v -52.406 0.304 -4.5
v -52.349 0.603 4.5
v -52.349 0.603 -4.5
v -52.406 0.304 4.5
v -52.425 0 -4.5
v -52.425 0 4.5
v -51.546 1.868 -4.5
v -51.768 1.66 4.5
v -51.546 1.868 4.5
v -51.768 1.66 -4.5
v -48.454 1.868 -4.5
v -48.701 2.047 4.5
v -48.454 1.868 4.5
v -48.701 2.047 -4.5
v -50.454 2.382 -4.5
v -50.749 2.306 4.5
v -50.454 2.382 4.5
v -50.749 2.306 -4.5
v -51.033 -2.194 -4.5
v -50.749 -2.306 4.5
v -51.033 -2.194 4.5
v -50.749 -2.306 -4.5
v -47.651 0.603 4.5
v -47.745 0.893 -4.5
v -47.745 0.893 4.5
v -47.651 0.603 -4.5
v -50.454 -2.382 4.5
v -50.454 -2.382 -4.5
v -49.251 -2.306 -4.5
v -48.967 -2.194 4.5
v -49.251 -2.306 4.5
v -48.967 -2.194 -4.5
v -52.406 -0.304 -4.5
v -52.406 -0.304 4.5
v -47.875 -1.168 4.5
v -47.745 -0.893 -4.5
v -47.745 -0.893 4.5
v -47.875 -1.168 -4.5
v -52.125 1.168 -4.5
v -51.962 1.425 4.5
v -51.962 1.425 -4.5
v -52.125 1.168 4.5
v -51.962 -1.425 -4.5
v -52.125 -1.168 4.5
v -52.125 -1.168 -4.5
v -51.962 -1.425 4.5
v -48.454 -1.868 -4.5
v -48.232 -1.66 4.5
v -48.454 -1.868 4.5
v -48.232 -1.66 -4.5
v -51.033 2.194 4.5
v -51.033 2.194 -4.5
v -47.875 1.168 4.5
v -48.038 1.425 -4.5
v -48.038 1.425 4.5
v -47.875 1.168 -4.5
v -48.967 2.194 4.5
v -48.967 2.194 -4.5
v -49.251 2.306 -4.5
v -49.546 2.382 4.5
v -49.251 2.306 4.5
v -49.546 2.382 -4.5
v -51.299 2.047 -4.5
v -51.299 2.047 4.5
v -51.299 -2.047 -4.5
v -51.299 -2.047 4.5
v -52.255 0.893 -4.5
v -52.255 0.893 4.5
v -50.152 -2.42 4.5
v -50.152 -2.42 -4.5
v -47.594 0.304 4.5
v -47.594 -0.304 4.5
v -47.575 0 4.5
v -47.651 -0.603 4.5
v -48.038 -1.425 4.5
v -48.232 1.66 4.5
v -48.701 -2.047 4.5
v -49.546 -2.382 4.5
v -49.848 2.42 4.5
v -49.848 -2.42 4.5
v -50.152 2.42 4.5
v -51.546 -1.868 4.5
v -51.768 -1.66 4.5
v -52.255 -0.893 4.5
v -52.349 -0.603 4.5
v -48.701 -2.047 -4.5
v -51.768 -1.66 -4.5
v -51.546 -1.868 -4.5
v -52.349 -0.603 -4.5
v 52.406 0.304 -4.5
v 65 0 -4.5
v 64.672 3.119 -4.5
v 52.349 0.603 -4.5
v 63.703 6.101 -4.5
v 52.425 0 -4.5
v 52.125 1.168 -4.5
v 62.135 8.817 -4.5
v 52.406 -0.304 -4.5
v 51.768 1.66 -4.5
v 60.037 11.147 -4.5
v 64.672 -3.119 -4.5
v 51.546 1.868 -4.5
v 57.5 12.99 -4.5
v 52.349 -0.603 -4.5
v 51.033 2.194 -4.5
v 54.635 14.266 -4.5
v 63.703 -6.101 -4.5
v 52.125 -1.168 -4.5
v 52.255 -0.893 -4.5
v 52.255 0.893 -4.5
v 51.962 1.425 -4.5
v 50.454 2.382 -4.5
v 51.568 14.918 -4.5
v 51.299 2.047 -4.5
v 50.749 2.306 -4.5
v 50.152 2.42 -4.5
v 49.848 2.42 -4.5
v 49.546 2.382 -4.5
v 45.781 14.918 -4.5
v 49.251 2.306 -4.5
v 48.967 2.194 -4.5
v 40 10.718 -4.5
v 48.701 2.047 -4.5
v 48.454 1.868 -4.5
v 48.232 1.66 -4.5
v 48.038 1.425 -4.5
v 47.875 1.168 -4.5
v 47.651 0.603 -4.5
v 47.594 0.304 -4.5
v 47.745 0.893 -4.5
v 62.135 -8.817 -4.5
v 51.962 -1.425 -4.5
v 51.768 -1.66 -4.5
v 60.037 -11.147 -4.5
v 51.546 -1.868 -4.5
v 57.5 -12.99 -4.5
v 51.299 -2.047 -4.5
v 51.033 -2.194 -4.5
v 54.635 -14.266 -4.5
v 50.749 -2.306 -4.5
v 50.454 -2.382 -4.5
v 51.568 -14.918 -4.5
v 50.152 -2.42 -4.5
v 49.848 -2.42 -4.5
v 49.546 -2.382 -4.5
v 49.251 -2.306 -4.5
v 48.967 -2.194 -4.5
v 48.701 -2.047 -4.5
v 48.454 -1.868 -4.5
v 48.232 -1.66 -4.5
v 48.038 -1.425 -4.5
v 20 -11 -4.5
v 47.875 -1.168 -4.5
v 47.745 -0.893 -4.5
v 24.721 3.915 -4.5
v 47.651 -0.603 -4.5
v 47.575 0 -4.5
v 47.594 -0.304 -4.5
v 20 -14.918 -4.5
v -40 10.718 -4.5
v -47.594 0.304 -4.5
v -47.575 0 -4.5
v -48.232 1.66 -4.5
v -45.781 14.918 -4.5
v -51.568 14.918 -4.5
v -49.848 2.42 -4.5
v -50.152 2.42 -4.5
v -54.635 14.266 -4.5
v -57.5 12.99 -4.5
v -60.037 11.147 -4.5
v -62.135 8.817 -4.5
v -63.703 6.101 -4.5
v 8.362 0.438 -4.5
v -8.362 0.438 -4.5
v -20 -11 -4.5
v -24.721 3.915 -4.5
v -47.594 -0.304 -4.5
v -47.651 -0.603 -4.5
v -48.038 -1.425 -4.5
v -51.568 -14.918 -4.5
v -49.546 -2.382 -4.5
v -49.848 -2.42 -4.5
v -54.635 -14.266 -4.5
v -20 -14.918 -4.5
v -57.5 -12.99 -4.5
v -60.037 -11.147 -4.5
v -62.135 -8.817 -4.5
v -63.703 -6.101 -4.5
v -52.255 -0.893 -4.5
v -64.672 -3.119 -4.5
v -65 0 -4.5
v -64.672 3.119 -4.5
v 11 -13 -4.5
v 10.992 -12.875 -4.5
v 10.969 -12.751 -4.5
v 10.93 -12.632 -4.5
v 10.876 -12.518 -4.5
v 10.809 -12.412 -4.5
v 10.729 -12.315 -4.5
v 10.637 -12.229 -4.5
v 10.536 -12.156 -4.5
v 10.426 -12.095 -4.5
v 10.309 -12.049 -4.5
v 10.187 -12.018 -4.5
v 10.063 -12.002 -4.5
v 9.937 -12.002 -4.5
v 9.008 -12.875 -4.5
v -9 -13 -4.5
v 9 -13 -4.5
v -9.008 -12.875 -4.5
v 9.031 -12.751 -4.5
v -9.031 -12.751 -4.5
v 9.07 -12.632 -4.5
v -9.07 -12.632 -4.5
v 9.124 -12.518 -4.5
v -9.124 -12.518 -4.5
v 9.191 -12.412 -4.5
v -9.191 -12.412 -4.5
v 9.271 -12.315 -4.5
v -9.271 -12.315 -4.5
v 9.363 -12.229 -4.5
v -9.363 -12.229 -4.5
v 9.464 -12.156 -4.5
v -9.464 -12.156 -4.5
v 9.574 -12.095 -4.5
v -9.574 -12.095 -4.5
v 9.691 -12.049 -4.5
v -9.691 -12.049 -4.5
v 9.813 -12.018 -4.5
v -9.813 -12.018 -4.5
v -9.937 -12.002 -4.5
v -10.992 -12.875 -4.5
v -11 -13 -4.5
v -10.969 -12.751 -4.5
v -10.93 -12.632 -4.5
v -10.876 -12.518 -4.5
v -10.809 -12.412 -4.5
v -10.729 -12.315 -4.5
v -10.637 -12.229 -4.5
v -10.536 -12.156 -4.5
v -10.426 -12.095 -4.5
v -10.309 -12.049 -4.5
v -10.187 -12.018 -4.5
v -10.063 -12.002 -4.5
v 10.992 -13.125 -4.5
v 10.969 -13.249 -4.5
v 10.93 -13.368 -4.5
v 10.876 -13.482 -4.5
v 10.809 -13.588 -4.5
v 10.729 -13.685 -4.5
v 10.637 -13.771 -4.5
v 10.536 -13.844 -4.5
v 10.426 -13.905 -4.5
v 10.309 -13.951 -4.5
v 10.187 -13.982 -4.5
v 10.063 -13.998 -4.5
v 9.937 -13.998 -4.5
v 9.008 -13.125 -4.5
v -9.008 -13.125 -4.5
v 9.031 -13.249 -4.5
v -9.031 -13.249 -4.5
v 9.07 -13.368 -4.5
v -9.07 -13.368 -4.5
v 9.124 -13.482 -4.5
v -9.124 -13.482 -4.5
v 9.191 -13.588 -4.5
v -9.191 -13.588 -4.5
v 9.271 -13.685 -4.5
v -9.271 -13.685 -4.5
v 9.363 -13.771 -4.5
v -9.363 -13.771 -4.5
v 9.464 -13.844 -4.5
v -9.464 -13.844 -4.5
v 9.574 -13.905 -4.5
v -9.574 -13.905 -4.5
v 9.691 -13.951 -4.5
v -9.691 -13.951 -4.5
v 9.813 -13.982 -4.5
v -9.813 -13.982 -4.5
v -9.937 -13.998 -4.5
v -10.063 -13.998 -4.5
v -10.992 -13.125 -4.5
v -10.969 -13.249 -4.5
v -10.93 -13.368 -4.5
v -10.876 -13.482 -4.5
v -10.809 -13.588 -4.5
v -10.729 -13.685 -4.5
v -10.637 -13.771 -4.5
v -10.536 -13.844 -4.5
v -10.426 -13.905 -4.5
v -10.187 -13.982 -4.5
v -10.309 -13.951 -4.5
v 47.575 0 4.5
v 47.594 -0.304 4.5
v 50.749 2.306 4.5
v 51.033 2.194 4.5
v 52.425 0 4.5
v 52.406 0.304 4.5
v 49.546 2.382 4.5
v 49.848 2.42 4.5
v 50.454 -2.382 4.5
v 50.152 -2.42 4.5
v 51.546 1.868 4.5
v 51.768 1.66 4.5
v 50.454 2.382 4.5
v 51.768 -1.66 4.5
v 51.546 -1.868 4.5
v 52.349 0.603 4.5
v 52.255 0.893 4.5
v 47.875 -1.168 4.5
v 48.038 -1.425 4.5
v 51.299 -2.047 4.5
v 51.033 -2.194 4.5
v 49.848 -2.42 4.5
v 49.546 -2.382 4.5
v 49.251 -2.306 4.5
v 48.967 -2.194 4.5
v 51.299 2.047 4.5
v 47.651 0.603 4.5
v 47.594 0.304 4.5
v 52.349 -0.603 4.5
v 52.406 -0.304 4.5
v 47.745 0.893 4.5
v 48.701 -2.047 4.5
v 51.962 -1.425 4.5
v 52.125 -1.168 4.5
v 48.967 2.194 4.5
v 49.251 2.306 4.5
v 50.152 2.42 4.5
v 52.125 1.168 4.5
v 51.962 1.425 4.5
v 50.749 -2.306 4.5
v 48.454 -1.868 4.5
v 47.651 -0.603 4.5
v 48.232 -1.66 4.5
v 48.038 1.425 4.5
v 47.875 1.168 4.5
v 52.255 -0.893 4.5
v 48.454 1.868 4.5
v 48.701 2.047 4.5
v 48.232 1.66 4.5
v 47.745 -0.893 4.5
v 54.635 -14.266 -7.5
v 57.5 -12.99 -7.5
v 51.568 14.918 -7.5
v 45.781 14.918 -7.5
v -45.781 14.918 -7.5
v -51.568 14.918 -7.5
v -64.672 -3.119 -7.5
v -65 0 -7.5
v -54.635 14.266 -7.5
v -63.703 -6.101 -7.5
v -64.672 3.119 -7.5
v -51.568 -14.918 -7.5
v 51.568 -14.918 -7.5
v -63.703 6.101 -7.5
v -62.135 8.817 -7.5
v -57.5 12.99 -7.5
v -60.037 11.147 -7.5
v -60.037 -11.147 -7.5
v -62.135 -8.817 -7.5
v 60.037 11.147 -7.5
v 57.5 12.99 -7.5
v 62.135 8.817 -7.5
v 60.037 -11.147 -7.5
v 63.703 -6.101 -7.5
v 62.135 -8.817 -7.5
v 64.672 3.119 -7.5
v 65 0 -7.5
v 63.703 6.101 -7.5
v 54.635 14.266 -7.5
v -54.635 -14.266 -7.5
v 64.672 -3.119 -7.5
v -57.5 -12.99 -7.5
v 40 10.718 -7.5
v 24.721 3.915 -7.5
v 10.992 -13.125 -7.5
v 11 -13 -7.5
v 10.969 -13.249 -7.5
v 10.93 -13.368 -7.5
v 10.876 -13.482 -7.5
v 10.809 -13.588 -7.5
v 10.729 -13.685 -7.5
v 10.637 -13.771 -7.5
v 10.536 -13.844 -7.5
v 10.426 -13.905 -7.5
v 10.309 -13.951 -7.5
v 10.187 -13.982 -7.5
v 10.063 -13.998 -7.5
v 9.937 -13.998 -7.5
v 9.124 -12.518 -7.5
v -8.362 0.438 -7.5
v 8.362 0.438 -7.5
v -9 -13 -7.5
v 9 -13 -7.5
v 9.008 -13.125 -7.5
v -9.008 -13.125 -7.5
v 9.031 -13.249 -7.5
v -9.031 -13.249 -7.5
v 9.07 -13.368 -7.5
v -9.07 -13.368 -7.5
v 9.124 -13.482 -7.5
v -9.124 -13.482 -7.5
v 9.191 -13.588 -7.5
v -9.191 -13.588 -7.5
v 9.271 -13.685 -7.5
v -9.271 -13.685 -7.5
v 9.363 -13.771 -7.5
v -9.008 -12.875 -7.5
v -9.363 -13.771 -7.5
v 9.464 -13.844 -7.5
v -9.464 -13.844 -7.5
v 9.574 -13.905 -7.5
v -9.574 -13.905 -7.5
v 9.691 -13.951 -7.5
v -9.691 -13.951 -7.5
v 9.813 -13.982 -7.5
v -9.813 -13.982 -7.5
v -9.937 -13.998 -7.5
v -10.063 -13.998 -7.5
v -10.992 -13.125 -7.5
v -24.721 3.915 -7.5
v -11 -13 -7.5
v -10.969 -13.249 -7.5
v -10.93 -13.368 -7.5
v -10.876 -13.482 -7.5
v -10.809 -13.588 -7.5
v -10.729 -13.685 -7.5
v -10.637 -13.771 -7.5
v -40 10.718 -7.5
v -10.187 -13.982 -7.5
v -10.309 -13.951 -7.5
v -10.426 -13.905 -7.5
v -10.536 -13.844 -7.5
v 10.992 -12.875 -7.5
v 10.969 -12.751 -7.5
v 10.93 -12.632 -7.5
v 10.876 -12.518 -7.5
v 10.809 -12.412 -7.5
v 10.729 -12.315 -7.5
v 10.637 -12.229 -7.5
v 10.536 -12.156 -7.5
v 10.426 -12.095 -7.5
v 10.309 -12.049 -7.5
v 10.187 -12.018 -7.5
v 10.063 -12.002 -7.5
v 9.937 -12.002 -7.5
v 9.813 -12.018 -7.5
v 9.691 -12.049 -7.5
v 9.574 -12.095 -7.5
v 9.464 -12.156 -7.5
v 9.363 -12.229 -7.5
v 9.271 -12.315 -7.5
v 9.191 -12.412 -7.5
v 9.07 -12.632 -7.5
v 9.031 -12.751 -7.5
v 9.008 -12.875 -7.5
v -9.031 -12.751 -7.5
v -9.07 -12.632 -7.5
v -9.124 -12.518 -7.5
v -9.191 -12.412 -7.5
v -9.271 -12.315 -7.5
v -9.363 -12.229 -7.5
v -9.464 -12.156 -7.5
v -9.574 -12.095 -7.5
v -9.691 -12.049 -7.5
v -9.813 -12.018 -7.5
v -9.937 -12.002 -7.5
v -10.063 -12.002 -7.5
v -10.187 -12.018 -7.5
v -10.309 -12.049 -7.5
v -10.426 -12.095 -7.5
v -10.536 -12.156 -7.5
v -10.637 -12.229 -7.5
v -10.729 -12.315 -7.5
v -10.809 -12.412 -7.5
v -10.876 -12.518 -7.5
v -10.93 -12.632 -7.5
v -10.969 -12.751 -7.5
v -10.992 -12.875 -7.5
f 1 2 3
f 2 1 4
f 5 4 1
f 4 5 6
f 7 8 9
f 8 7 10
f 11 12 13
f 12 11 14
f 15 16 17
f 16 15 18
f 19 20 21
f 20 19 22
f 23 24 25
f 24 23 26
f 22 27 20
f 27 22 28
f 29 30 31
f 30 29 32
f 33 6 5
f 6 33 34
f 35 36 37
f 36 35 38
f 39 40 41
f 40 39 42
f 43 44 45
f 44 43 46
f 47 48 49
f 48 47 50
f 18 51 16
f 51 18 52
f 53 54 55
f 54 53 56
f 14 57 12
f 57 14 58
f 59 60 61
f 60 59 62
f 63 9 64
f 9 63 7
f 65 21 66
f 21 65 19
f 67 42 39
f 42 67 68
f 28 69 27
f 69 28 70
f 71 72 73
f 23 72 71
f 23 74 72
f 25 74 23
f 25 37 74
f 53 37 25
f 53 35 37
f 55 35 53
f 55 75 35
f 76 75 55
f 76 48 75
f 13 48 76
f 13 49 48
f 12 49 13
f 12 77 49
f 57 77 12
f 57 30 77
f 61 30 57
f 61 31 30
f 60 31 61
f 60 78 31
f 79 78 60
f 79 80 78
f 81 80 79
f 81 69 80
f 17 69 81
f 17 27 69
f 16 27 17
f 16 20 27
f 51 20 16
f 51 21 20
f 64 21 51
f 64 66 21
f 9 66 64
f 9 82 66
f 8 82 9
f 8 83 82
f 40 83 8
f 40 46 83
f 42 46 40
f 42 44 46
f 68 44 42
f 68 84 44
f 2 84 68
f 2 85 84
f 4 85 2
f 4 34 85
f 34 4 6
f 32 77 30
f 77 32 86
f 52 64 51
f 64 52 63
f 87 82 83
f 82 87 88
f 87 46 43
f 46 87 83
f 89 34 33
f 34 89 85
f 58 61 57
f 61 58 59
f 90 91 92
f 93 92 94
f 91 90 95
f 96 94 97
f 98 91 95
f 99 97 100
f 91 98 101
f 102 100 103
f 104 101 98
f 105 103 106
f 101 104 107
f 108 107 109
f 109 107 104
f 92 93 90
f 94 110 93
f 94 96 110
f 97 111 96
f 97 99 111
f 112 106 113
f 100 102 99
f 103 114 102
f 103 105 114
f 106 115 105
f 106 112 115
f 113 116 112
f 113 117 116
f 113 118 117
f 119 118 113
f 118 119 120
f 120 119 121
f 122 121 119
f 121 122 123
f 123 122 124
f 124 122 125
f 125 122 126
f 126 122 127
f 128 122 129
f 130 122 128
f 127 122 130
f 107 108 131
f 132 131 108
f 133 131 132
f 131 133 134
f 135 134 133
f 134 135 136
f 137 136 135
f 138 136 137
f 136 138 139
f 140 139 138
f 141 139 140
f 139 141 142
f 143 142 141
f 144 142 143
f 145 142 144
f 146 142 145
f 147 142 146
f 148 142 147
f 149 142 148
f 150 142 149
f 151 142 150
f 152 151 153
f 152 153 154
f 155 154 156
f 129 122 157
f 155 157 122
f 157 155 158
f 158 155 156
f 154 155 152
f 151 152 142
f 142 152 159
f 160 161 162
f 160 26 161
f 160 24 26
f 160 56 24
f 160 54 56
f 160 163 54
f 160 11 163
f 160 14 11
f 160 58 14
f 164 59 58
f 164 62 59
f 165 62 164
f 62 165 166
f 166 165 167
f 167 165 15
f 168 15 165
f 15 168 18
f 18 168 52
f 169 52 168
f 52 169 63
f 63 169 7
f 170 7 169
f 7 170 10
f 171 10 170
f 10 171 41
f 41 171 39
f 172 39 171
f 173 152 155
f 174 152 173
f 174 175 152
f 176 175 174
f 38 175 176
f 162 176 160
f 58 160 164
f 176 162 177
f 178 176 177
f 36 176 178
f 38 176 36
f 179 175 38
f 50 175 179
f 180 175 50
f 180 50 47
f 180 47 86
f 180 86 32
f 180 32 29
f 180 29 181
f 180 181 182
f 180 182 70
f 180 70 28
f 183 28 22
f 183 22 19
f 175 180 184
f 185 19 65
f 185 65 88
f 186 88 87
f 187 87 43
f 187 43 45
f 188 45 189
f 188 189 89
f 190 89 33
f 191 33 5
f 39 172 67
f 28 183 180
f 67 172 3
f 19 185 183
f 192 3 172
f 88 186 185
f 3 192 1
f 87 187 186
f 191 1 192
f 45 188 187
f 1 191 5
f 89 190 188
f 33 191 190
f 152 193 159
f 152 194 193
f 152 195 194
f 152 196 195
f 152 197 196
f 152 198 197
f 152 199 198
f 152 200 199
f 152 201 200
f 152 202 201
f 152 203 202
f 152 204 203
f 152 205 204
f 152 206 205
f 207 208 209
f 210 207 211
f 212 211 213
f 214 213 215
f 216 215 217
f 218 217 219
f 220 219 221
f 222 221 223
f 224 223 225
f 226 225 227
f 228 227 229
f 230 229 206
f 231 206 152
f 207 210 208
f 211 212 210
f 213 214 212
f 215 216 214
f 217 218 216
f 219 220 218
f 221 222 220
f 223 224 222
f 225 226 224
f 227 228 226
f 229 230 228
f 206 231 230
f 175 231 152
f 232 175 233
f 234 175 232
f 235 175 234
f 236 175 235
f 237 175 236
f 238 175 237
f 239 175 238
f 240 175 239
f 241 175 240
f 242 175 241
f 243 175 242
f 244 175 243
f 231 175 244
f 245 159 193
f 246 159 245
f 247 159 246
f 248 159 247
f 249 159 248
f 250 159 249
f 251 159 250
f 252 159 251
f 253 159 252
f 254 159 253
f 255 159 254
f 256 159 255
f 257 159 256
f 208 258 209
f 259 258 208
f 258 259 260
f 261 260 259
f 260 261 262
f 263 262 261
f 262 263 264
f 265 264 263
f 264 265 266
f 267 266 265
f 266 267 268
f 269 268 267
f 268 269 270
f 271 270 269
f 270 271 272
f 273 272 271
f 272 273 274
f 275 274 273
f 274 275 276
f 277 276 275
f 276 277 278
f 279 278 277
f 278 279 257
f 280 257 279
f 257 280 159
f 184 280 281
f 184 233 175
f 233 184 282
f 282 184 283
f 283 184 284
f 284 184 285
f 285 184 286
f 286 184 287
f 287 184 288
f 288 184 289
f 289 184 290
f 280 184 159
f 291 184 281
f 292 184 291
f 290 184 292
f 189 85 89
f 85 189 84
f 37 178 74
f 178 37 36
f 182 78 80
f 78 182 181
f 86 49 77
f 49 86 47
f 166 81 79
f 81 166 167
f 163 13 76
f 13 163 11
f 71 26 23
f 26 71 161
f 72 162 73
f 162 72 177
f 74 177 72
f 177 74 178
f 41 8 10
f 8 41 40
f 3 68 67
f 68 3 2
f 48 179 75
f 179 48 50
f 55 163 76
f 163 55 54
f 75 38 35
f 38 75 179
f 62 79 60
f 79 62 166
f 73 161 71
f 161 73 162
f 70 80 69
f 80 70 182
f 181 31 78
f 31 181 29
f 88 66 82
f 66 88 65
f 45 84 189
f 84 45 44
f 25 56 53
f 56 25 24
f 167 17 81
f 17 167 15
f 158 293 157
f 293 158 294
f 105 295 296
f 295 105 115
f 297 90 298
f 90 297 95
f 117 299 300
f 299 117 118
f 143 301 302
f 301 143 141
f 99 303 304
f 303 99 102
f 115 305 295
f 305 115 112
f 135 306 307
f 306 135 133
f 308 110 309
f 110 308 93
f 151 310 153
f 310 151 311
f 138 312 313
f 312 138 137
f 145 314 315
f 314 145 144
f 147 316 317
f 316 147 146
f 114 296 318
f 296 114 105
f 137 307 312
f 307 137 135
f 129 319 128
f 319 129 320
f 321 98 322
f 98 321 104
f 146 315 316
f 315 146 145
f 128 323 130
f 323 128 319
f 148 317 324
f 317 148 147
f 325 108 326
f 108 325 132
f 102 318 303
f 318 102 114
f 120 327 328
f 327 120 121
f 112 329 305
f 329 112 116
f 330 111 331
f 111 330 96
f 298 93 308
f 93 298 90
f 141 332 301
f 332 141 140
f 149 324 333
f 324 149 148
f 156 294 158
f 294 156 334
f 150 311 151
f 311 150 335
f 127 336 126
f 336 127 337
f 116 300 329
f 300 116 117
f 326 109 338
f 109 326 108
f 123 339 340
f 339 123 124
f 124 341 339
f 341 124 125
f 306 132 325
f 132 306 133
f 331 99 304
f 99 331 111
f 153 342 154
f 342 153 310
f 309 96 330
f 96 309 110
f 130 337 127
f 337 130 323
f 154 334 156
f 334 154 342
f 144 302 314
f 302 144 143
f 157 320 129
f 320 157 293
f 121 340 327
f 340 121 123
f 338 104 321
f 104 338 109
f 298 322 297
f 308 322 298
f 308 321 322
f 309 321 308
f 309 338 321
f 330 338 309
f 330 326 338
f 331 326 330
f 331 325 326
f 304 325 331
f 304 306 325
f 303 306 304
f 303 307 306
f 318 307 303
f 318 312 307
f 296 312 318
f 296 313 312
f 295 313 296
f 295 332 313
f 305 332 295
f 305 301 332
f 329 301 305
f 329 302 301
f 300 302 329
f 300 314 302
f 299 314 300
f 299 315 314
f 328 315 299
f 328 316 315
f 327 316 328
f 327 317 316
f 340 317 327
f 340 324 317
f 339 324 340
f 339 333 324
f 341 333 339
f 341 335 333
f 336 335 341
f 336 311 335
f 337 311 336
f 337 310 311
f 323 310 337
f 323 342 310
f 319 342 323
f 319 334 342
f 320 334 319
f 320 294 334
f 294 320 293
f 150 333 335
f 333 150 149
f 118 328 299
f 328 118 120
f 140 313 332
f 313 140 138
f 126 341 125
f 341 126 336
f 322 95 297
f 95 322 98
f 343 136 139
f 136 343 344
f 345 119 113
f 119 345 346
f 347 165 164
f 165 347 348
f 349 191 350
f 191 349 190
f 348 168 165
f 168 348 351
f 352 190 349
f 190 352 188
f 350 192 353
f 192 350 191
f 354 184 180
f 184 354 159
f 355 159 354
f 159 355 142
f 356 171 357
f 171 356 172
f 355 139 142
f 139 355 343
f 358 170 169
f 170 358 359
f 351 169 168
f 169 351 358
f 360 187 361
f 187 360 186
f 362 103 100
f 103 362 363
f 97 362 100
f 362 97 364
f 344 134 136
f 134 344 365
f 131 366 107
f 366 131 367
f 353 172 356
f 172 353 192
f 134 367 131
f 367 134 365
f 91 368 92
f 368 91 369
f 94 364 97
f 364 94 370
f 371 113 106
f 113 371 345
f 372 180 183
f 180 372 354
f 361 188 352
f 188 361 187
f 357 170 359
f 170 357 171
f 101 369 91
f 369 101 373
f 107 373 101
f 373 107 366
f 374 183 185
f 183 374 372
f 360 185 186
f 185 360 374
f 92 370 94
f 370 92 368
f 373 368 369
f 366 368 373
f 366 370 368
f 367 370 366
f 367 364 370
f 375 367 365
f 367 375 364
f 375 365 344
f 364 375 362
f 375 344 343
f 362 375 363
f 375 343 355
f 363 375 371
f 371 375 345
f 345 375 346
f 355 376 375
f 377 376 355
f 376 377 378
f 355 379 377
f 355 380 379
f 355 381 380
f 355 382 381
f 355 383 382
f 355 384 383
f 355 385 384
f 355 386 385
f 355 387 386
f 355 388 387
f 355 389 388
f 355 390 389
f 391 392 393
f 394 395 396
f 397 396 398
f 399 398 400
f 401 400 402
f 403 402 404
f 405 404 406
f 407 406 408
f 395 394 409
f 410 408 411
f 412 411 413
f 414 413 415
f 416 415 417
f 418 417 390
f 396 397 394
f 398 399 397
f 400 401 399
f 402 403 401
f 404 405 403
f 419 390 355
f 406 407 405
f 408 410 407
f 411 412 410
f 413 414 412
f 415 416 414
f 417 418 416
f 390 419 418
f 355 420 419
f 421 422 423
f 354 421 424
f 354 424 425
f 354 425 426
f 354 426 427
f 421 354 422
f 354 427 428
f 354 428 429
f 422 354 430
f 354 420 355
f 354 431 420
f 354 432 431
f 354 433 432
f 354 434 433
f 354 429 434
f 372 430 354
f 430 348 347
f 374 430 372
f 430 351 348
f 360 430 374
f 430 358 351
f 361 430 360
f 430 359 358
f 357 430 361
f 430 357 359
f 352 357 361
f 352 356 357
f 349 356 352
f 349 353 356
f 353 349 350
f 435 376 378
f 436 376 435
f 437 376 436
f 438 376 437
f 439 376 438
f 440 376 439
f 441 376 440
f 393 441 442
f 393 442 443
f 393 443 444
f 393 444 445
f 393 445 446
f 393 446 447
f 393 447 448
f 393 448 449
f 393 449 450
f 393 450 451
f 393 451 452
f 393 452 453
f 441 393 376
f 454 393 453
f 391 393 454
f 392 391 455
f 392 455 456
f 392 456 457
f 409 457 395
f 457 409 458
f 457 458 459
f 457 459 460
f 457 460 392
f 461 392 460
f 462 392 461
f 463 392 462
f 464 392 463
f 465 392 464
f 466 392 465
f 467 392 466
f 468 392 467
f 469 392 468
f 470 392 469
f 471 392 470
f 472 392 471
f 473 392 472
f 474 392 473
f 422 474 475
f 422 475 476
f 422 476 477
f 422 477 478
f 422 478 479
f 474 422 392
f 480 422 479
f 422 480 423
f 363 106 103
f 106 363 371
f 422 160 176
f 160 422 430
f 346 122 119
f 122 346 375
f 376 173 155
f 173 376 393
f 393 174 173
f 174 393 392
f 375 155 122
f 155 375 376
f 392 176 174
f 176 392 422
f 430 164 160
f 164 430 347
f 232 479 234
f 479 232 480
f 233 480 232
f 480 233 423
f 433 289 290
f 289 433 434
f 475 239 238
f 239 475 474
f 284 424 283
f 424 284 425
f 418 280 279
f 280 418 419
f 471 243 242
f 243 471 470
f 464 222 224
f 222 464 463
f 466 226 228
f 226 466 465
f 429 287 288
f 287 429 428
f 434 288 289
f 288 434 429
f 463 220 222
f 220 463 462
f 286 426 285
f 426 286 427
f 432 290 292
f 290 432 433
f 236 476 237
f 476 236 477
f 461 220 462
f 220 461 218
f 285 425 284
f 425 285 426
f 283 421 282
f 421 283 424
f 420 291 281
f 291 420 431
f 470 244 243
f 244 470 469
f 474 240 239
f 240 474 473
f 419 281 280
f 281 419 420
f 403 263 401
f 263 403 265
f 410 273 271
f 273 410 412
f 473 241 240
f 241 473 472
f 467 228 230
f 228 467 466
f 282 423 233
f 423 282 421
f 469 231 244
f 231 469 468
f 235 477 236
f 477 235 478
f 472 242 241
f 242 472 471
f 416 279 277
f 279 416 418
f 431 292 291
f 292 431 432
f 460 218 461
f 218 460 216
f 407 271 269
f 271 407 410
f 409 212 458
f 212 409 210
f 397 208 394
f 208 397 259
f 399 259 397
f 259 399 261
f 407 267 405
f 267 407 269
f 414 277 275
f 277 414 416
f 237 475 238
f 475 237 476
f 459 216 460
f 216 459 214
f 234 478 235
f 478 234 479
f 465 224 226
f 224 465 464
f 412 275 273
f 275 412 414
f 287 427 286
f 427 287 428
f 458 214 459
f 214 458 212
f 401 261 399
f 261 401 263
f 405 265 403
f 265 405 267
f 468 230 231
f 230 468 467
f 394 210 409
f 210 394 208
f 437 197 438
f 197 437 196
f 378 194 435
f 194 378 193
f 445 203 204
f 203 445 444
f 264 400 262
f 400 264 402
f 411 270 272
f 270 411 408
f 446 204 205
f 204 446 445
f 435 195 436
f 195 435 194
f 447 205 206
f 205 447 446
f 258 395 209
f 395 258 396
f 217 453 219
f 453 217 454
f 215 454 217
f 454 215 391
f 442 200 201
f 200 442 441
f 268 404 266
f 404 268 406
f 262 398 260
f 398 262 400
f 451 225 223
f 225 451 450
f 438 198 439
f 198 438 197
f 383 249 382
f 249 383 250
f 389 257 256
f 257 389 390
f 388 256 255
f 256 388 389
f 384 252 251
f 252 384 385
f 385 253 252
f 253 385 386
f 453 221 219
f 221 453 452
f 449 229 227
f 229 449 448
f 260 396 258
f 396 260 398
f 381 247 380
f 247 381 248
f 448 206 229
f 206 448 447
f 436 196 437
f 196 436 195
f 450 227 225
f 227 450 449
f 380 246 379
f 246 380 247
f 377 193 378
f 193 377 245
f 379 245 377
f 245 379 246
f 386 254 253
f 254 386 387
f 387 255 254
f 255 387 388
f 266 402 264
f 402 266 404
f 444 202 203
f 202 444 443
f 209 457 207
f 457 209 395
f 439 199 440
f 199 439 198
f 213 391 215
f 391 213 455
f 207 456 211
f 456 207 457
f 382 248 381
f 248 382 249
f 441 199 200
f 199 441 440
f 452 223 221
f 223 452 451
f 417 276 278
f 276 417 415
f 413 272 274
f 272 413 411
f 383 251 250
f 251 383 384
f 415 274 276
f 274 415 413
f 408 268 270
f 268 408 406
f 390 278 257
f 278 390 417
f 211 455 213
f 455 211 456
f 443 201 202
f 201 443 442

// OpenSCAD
// file: hexagone.scad
function cot(x)=1/tan(x);

module Hexagone(cle,h)
{
	angle = 360/6;		// 6 pans
	cote = cle * cot(angle);
	echo(angle, cot(angle), cote);
	echo(acos(.6));

	union()
	{
		rotate([0,0,0])
			cube([cle,cote,h],center=true);
		rotate([0,0,angle])
			cube([cle,cote,h],center=true);
		rotate([0,0,2*angle])
			cube([cle,cote,h],center=true);
	}
}
// file: utils.scad
module mv(x, y, z) {
    translate([x,y,z]) {
        children([0 : $children]);
   }
}

module rot(x, y, z) {
    rotate([x,y,z]) {
        children([0 : $children]);
   }
}

module trans() {
    %children();
}

module hash() {
    #children();
}

module fidt() {
    children(0);
    difference() {
        trans()
        children(1);
        hash()
        children(0);
   }
}

module fid() {
    difference() {
        children(1);
        children(0);
   }
}

module dif() {
    difference() {
        children(0);
        children(1);
   }
}

module dift() {
    children(1);
    difference() {
        trans()
        children(0);
        hash()
        children(1);
   }
}

module mirx() {
    children(0);
    mirror([1,0,0]) {
        children(0);
   }
}

module miry() {
    children(0);
    mirror([0,1,0]) {
        children(0);
   }
}

module mirz() {
    children(0);
    mirror([0,0,1]) {
        children(0);
   }
}
// main file
include<utils.scad>
include<hexagone.scad>

/*mv(-160,-120,-20)*/
/*import("/home/leo/clone/Summera/stl_save/The_Ultimate_Spool_Holder_v2.stl", center=true);*/

bearing_internal_diam=4.85;
bearing_external_diam=16;
bearing_internal_height=5+4;

roller_cylinder_diam=30;
roller_cylinder_height=3;

bearing_dist=100;

module internal_bearing() {
    mirx() {
        mv(bearing_dist/2, 0, 0) {
            cylinder(h=bearing_internal_height,d=bearing_internal_diam, center=true, $fn=50);
        }
    }
}

module roller() {
    dif() {
        hull(){
            mirx() {
                mv(bearing_dist/2, 0, 0) {
                    mv(0,0,roller_cylinder_height/2+bearing_internal_height/2)
                        cylinder(h=roller_cylinder_height,d=roller_cylinder_diam, center=true);
                }
            }
        }

        mv(0,80,roller_cylinder_height/2+bearing_internal_height/2)
            cylinder(d=80*2, h=roller_cylinder_height, center=true);
    }
}

/*dif(){*/
    /*fid() {*/
        /*union() {*/
            /*internal_bearing();*/
            /*roller();*/
        /*}*/

        /*union() {*/
            /*mv(0,0,-bearing_internal_height) {*/
                /*fid() {*/
                    /*mv(0,0,bearing_internal_height/2) {*/
                        /*internal_bearing();*/
                    /*}*/
                    /*roller();*/
                /*}*/
            /*}*/

            /*mv(0,-roller_cylinder_diam/2+2,0)*/
                /*cube([40,4,bearing_internal_height], center=true);*/
        /*}*/
    /*}*/

    /*union(){*/
        /*mv(0,-15,1)*/
            /*rot(90,0,0)*/
            /*cylinder(d=4, h=20, center=true, $fn=50);*/

        /*mirx() {*/
            /*mv(10,-roller_cylinder_diam/2+2,0) {*/
                /*cylinder(d=2, h=20, center=true, $fn=50);*/
            /*}*/
        /*}*/
    /*}*/
/*}*/

rot(0,180,0)
mv(0,0,0)
dif(){
    dif() {
        union() {
            internal_bearing();
            roller();
        }

        union() {
            mv(0,0,-bearing_internal_height) {
                fid() {
                    mv(0,0,bearing_internal_height/2) {
                        internal_bearing();
                    }
                    roller();
                }
            }

            mv(0,-roller_cylinder_diam/2+2,0)
                cube([40,4,bearing_internal_height], center=true);
        }
    }

    union(){
        mv(0,-15,1)
            rot(90,0,0)
            cylinder(d=4, h=20, center=true, $fn=50);

        mirx() {
            mv(10,-roller_cylinder_diam/2+2,0) {
                cylinder(d=2, h=20, center=true, $fn=50);
            }
        }
    }
}
